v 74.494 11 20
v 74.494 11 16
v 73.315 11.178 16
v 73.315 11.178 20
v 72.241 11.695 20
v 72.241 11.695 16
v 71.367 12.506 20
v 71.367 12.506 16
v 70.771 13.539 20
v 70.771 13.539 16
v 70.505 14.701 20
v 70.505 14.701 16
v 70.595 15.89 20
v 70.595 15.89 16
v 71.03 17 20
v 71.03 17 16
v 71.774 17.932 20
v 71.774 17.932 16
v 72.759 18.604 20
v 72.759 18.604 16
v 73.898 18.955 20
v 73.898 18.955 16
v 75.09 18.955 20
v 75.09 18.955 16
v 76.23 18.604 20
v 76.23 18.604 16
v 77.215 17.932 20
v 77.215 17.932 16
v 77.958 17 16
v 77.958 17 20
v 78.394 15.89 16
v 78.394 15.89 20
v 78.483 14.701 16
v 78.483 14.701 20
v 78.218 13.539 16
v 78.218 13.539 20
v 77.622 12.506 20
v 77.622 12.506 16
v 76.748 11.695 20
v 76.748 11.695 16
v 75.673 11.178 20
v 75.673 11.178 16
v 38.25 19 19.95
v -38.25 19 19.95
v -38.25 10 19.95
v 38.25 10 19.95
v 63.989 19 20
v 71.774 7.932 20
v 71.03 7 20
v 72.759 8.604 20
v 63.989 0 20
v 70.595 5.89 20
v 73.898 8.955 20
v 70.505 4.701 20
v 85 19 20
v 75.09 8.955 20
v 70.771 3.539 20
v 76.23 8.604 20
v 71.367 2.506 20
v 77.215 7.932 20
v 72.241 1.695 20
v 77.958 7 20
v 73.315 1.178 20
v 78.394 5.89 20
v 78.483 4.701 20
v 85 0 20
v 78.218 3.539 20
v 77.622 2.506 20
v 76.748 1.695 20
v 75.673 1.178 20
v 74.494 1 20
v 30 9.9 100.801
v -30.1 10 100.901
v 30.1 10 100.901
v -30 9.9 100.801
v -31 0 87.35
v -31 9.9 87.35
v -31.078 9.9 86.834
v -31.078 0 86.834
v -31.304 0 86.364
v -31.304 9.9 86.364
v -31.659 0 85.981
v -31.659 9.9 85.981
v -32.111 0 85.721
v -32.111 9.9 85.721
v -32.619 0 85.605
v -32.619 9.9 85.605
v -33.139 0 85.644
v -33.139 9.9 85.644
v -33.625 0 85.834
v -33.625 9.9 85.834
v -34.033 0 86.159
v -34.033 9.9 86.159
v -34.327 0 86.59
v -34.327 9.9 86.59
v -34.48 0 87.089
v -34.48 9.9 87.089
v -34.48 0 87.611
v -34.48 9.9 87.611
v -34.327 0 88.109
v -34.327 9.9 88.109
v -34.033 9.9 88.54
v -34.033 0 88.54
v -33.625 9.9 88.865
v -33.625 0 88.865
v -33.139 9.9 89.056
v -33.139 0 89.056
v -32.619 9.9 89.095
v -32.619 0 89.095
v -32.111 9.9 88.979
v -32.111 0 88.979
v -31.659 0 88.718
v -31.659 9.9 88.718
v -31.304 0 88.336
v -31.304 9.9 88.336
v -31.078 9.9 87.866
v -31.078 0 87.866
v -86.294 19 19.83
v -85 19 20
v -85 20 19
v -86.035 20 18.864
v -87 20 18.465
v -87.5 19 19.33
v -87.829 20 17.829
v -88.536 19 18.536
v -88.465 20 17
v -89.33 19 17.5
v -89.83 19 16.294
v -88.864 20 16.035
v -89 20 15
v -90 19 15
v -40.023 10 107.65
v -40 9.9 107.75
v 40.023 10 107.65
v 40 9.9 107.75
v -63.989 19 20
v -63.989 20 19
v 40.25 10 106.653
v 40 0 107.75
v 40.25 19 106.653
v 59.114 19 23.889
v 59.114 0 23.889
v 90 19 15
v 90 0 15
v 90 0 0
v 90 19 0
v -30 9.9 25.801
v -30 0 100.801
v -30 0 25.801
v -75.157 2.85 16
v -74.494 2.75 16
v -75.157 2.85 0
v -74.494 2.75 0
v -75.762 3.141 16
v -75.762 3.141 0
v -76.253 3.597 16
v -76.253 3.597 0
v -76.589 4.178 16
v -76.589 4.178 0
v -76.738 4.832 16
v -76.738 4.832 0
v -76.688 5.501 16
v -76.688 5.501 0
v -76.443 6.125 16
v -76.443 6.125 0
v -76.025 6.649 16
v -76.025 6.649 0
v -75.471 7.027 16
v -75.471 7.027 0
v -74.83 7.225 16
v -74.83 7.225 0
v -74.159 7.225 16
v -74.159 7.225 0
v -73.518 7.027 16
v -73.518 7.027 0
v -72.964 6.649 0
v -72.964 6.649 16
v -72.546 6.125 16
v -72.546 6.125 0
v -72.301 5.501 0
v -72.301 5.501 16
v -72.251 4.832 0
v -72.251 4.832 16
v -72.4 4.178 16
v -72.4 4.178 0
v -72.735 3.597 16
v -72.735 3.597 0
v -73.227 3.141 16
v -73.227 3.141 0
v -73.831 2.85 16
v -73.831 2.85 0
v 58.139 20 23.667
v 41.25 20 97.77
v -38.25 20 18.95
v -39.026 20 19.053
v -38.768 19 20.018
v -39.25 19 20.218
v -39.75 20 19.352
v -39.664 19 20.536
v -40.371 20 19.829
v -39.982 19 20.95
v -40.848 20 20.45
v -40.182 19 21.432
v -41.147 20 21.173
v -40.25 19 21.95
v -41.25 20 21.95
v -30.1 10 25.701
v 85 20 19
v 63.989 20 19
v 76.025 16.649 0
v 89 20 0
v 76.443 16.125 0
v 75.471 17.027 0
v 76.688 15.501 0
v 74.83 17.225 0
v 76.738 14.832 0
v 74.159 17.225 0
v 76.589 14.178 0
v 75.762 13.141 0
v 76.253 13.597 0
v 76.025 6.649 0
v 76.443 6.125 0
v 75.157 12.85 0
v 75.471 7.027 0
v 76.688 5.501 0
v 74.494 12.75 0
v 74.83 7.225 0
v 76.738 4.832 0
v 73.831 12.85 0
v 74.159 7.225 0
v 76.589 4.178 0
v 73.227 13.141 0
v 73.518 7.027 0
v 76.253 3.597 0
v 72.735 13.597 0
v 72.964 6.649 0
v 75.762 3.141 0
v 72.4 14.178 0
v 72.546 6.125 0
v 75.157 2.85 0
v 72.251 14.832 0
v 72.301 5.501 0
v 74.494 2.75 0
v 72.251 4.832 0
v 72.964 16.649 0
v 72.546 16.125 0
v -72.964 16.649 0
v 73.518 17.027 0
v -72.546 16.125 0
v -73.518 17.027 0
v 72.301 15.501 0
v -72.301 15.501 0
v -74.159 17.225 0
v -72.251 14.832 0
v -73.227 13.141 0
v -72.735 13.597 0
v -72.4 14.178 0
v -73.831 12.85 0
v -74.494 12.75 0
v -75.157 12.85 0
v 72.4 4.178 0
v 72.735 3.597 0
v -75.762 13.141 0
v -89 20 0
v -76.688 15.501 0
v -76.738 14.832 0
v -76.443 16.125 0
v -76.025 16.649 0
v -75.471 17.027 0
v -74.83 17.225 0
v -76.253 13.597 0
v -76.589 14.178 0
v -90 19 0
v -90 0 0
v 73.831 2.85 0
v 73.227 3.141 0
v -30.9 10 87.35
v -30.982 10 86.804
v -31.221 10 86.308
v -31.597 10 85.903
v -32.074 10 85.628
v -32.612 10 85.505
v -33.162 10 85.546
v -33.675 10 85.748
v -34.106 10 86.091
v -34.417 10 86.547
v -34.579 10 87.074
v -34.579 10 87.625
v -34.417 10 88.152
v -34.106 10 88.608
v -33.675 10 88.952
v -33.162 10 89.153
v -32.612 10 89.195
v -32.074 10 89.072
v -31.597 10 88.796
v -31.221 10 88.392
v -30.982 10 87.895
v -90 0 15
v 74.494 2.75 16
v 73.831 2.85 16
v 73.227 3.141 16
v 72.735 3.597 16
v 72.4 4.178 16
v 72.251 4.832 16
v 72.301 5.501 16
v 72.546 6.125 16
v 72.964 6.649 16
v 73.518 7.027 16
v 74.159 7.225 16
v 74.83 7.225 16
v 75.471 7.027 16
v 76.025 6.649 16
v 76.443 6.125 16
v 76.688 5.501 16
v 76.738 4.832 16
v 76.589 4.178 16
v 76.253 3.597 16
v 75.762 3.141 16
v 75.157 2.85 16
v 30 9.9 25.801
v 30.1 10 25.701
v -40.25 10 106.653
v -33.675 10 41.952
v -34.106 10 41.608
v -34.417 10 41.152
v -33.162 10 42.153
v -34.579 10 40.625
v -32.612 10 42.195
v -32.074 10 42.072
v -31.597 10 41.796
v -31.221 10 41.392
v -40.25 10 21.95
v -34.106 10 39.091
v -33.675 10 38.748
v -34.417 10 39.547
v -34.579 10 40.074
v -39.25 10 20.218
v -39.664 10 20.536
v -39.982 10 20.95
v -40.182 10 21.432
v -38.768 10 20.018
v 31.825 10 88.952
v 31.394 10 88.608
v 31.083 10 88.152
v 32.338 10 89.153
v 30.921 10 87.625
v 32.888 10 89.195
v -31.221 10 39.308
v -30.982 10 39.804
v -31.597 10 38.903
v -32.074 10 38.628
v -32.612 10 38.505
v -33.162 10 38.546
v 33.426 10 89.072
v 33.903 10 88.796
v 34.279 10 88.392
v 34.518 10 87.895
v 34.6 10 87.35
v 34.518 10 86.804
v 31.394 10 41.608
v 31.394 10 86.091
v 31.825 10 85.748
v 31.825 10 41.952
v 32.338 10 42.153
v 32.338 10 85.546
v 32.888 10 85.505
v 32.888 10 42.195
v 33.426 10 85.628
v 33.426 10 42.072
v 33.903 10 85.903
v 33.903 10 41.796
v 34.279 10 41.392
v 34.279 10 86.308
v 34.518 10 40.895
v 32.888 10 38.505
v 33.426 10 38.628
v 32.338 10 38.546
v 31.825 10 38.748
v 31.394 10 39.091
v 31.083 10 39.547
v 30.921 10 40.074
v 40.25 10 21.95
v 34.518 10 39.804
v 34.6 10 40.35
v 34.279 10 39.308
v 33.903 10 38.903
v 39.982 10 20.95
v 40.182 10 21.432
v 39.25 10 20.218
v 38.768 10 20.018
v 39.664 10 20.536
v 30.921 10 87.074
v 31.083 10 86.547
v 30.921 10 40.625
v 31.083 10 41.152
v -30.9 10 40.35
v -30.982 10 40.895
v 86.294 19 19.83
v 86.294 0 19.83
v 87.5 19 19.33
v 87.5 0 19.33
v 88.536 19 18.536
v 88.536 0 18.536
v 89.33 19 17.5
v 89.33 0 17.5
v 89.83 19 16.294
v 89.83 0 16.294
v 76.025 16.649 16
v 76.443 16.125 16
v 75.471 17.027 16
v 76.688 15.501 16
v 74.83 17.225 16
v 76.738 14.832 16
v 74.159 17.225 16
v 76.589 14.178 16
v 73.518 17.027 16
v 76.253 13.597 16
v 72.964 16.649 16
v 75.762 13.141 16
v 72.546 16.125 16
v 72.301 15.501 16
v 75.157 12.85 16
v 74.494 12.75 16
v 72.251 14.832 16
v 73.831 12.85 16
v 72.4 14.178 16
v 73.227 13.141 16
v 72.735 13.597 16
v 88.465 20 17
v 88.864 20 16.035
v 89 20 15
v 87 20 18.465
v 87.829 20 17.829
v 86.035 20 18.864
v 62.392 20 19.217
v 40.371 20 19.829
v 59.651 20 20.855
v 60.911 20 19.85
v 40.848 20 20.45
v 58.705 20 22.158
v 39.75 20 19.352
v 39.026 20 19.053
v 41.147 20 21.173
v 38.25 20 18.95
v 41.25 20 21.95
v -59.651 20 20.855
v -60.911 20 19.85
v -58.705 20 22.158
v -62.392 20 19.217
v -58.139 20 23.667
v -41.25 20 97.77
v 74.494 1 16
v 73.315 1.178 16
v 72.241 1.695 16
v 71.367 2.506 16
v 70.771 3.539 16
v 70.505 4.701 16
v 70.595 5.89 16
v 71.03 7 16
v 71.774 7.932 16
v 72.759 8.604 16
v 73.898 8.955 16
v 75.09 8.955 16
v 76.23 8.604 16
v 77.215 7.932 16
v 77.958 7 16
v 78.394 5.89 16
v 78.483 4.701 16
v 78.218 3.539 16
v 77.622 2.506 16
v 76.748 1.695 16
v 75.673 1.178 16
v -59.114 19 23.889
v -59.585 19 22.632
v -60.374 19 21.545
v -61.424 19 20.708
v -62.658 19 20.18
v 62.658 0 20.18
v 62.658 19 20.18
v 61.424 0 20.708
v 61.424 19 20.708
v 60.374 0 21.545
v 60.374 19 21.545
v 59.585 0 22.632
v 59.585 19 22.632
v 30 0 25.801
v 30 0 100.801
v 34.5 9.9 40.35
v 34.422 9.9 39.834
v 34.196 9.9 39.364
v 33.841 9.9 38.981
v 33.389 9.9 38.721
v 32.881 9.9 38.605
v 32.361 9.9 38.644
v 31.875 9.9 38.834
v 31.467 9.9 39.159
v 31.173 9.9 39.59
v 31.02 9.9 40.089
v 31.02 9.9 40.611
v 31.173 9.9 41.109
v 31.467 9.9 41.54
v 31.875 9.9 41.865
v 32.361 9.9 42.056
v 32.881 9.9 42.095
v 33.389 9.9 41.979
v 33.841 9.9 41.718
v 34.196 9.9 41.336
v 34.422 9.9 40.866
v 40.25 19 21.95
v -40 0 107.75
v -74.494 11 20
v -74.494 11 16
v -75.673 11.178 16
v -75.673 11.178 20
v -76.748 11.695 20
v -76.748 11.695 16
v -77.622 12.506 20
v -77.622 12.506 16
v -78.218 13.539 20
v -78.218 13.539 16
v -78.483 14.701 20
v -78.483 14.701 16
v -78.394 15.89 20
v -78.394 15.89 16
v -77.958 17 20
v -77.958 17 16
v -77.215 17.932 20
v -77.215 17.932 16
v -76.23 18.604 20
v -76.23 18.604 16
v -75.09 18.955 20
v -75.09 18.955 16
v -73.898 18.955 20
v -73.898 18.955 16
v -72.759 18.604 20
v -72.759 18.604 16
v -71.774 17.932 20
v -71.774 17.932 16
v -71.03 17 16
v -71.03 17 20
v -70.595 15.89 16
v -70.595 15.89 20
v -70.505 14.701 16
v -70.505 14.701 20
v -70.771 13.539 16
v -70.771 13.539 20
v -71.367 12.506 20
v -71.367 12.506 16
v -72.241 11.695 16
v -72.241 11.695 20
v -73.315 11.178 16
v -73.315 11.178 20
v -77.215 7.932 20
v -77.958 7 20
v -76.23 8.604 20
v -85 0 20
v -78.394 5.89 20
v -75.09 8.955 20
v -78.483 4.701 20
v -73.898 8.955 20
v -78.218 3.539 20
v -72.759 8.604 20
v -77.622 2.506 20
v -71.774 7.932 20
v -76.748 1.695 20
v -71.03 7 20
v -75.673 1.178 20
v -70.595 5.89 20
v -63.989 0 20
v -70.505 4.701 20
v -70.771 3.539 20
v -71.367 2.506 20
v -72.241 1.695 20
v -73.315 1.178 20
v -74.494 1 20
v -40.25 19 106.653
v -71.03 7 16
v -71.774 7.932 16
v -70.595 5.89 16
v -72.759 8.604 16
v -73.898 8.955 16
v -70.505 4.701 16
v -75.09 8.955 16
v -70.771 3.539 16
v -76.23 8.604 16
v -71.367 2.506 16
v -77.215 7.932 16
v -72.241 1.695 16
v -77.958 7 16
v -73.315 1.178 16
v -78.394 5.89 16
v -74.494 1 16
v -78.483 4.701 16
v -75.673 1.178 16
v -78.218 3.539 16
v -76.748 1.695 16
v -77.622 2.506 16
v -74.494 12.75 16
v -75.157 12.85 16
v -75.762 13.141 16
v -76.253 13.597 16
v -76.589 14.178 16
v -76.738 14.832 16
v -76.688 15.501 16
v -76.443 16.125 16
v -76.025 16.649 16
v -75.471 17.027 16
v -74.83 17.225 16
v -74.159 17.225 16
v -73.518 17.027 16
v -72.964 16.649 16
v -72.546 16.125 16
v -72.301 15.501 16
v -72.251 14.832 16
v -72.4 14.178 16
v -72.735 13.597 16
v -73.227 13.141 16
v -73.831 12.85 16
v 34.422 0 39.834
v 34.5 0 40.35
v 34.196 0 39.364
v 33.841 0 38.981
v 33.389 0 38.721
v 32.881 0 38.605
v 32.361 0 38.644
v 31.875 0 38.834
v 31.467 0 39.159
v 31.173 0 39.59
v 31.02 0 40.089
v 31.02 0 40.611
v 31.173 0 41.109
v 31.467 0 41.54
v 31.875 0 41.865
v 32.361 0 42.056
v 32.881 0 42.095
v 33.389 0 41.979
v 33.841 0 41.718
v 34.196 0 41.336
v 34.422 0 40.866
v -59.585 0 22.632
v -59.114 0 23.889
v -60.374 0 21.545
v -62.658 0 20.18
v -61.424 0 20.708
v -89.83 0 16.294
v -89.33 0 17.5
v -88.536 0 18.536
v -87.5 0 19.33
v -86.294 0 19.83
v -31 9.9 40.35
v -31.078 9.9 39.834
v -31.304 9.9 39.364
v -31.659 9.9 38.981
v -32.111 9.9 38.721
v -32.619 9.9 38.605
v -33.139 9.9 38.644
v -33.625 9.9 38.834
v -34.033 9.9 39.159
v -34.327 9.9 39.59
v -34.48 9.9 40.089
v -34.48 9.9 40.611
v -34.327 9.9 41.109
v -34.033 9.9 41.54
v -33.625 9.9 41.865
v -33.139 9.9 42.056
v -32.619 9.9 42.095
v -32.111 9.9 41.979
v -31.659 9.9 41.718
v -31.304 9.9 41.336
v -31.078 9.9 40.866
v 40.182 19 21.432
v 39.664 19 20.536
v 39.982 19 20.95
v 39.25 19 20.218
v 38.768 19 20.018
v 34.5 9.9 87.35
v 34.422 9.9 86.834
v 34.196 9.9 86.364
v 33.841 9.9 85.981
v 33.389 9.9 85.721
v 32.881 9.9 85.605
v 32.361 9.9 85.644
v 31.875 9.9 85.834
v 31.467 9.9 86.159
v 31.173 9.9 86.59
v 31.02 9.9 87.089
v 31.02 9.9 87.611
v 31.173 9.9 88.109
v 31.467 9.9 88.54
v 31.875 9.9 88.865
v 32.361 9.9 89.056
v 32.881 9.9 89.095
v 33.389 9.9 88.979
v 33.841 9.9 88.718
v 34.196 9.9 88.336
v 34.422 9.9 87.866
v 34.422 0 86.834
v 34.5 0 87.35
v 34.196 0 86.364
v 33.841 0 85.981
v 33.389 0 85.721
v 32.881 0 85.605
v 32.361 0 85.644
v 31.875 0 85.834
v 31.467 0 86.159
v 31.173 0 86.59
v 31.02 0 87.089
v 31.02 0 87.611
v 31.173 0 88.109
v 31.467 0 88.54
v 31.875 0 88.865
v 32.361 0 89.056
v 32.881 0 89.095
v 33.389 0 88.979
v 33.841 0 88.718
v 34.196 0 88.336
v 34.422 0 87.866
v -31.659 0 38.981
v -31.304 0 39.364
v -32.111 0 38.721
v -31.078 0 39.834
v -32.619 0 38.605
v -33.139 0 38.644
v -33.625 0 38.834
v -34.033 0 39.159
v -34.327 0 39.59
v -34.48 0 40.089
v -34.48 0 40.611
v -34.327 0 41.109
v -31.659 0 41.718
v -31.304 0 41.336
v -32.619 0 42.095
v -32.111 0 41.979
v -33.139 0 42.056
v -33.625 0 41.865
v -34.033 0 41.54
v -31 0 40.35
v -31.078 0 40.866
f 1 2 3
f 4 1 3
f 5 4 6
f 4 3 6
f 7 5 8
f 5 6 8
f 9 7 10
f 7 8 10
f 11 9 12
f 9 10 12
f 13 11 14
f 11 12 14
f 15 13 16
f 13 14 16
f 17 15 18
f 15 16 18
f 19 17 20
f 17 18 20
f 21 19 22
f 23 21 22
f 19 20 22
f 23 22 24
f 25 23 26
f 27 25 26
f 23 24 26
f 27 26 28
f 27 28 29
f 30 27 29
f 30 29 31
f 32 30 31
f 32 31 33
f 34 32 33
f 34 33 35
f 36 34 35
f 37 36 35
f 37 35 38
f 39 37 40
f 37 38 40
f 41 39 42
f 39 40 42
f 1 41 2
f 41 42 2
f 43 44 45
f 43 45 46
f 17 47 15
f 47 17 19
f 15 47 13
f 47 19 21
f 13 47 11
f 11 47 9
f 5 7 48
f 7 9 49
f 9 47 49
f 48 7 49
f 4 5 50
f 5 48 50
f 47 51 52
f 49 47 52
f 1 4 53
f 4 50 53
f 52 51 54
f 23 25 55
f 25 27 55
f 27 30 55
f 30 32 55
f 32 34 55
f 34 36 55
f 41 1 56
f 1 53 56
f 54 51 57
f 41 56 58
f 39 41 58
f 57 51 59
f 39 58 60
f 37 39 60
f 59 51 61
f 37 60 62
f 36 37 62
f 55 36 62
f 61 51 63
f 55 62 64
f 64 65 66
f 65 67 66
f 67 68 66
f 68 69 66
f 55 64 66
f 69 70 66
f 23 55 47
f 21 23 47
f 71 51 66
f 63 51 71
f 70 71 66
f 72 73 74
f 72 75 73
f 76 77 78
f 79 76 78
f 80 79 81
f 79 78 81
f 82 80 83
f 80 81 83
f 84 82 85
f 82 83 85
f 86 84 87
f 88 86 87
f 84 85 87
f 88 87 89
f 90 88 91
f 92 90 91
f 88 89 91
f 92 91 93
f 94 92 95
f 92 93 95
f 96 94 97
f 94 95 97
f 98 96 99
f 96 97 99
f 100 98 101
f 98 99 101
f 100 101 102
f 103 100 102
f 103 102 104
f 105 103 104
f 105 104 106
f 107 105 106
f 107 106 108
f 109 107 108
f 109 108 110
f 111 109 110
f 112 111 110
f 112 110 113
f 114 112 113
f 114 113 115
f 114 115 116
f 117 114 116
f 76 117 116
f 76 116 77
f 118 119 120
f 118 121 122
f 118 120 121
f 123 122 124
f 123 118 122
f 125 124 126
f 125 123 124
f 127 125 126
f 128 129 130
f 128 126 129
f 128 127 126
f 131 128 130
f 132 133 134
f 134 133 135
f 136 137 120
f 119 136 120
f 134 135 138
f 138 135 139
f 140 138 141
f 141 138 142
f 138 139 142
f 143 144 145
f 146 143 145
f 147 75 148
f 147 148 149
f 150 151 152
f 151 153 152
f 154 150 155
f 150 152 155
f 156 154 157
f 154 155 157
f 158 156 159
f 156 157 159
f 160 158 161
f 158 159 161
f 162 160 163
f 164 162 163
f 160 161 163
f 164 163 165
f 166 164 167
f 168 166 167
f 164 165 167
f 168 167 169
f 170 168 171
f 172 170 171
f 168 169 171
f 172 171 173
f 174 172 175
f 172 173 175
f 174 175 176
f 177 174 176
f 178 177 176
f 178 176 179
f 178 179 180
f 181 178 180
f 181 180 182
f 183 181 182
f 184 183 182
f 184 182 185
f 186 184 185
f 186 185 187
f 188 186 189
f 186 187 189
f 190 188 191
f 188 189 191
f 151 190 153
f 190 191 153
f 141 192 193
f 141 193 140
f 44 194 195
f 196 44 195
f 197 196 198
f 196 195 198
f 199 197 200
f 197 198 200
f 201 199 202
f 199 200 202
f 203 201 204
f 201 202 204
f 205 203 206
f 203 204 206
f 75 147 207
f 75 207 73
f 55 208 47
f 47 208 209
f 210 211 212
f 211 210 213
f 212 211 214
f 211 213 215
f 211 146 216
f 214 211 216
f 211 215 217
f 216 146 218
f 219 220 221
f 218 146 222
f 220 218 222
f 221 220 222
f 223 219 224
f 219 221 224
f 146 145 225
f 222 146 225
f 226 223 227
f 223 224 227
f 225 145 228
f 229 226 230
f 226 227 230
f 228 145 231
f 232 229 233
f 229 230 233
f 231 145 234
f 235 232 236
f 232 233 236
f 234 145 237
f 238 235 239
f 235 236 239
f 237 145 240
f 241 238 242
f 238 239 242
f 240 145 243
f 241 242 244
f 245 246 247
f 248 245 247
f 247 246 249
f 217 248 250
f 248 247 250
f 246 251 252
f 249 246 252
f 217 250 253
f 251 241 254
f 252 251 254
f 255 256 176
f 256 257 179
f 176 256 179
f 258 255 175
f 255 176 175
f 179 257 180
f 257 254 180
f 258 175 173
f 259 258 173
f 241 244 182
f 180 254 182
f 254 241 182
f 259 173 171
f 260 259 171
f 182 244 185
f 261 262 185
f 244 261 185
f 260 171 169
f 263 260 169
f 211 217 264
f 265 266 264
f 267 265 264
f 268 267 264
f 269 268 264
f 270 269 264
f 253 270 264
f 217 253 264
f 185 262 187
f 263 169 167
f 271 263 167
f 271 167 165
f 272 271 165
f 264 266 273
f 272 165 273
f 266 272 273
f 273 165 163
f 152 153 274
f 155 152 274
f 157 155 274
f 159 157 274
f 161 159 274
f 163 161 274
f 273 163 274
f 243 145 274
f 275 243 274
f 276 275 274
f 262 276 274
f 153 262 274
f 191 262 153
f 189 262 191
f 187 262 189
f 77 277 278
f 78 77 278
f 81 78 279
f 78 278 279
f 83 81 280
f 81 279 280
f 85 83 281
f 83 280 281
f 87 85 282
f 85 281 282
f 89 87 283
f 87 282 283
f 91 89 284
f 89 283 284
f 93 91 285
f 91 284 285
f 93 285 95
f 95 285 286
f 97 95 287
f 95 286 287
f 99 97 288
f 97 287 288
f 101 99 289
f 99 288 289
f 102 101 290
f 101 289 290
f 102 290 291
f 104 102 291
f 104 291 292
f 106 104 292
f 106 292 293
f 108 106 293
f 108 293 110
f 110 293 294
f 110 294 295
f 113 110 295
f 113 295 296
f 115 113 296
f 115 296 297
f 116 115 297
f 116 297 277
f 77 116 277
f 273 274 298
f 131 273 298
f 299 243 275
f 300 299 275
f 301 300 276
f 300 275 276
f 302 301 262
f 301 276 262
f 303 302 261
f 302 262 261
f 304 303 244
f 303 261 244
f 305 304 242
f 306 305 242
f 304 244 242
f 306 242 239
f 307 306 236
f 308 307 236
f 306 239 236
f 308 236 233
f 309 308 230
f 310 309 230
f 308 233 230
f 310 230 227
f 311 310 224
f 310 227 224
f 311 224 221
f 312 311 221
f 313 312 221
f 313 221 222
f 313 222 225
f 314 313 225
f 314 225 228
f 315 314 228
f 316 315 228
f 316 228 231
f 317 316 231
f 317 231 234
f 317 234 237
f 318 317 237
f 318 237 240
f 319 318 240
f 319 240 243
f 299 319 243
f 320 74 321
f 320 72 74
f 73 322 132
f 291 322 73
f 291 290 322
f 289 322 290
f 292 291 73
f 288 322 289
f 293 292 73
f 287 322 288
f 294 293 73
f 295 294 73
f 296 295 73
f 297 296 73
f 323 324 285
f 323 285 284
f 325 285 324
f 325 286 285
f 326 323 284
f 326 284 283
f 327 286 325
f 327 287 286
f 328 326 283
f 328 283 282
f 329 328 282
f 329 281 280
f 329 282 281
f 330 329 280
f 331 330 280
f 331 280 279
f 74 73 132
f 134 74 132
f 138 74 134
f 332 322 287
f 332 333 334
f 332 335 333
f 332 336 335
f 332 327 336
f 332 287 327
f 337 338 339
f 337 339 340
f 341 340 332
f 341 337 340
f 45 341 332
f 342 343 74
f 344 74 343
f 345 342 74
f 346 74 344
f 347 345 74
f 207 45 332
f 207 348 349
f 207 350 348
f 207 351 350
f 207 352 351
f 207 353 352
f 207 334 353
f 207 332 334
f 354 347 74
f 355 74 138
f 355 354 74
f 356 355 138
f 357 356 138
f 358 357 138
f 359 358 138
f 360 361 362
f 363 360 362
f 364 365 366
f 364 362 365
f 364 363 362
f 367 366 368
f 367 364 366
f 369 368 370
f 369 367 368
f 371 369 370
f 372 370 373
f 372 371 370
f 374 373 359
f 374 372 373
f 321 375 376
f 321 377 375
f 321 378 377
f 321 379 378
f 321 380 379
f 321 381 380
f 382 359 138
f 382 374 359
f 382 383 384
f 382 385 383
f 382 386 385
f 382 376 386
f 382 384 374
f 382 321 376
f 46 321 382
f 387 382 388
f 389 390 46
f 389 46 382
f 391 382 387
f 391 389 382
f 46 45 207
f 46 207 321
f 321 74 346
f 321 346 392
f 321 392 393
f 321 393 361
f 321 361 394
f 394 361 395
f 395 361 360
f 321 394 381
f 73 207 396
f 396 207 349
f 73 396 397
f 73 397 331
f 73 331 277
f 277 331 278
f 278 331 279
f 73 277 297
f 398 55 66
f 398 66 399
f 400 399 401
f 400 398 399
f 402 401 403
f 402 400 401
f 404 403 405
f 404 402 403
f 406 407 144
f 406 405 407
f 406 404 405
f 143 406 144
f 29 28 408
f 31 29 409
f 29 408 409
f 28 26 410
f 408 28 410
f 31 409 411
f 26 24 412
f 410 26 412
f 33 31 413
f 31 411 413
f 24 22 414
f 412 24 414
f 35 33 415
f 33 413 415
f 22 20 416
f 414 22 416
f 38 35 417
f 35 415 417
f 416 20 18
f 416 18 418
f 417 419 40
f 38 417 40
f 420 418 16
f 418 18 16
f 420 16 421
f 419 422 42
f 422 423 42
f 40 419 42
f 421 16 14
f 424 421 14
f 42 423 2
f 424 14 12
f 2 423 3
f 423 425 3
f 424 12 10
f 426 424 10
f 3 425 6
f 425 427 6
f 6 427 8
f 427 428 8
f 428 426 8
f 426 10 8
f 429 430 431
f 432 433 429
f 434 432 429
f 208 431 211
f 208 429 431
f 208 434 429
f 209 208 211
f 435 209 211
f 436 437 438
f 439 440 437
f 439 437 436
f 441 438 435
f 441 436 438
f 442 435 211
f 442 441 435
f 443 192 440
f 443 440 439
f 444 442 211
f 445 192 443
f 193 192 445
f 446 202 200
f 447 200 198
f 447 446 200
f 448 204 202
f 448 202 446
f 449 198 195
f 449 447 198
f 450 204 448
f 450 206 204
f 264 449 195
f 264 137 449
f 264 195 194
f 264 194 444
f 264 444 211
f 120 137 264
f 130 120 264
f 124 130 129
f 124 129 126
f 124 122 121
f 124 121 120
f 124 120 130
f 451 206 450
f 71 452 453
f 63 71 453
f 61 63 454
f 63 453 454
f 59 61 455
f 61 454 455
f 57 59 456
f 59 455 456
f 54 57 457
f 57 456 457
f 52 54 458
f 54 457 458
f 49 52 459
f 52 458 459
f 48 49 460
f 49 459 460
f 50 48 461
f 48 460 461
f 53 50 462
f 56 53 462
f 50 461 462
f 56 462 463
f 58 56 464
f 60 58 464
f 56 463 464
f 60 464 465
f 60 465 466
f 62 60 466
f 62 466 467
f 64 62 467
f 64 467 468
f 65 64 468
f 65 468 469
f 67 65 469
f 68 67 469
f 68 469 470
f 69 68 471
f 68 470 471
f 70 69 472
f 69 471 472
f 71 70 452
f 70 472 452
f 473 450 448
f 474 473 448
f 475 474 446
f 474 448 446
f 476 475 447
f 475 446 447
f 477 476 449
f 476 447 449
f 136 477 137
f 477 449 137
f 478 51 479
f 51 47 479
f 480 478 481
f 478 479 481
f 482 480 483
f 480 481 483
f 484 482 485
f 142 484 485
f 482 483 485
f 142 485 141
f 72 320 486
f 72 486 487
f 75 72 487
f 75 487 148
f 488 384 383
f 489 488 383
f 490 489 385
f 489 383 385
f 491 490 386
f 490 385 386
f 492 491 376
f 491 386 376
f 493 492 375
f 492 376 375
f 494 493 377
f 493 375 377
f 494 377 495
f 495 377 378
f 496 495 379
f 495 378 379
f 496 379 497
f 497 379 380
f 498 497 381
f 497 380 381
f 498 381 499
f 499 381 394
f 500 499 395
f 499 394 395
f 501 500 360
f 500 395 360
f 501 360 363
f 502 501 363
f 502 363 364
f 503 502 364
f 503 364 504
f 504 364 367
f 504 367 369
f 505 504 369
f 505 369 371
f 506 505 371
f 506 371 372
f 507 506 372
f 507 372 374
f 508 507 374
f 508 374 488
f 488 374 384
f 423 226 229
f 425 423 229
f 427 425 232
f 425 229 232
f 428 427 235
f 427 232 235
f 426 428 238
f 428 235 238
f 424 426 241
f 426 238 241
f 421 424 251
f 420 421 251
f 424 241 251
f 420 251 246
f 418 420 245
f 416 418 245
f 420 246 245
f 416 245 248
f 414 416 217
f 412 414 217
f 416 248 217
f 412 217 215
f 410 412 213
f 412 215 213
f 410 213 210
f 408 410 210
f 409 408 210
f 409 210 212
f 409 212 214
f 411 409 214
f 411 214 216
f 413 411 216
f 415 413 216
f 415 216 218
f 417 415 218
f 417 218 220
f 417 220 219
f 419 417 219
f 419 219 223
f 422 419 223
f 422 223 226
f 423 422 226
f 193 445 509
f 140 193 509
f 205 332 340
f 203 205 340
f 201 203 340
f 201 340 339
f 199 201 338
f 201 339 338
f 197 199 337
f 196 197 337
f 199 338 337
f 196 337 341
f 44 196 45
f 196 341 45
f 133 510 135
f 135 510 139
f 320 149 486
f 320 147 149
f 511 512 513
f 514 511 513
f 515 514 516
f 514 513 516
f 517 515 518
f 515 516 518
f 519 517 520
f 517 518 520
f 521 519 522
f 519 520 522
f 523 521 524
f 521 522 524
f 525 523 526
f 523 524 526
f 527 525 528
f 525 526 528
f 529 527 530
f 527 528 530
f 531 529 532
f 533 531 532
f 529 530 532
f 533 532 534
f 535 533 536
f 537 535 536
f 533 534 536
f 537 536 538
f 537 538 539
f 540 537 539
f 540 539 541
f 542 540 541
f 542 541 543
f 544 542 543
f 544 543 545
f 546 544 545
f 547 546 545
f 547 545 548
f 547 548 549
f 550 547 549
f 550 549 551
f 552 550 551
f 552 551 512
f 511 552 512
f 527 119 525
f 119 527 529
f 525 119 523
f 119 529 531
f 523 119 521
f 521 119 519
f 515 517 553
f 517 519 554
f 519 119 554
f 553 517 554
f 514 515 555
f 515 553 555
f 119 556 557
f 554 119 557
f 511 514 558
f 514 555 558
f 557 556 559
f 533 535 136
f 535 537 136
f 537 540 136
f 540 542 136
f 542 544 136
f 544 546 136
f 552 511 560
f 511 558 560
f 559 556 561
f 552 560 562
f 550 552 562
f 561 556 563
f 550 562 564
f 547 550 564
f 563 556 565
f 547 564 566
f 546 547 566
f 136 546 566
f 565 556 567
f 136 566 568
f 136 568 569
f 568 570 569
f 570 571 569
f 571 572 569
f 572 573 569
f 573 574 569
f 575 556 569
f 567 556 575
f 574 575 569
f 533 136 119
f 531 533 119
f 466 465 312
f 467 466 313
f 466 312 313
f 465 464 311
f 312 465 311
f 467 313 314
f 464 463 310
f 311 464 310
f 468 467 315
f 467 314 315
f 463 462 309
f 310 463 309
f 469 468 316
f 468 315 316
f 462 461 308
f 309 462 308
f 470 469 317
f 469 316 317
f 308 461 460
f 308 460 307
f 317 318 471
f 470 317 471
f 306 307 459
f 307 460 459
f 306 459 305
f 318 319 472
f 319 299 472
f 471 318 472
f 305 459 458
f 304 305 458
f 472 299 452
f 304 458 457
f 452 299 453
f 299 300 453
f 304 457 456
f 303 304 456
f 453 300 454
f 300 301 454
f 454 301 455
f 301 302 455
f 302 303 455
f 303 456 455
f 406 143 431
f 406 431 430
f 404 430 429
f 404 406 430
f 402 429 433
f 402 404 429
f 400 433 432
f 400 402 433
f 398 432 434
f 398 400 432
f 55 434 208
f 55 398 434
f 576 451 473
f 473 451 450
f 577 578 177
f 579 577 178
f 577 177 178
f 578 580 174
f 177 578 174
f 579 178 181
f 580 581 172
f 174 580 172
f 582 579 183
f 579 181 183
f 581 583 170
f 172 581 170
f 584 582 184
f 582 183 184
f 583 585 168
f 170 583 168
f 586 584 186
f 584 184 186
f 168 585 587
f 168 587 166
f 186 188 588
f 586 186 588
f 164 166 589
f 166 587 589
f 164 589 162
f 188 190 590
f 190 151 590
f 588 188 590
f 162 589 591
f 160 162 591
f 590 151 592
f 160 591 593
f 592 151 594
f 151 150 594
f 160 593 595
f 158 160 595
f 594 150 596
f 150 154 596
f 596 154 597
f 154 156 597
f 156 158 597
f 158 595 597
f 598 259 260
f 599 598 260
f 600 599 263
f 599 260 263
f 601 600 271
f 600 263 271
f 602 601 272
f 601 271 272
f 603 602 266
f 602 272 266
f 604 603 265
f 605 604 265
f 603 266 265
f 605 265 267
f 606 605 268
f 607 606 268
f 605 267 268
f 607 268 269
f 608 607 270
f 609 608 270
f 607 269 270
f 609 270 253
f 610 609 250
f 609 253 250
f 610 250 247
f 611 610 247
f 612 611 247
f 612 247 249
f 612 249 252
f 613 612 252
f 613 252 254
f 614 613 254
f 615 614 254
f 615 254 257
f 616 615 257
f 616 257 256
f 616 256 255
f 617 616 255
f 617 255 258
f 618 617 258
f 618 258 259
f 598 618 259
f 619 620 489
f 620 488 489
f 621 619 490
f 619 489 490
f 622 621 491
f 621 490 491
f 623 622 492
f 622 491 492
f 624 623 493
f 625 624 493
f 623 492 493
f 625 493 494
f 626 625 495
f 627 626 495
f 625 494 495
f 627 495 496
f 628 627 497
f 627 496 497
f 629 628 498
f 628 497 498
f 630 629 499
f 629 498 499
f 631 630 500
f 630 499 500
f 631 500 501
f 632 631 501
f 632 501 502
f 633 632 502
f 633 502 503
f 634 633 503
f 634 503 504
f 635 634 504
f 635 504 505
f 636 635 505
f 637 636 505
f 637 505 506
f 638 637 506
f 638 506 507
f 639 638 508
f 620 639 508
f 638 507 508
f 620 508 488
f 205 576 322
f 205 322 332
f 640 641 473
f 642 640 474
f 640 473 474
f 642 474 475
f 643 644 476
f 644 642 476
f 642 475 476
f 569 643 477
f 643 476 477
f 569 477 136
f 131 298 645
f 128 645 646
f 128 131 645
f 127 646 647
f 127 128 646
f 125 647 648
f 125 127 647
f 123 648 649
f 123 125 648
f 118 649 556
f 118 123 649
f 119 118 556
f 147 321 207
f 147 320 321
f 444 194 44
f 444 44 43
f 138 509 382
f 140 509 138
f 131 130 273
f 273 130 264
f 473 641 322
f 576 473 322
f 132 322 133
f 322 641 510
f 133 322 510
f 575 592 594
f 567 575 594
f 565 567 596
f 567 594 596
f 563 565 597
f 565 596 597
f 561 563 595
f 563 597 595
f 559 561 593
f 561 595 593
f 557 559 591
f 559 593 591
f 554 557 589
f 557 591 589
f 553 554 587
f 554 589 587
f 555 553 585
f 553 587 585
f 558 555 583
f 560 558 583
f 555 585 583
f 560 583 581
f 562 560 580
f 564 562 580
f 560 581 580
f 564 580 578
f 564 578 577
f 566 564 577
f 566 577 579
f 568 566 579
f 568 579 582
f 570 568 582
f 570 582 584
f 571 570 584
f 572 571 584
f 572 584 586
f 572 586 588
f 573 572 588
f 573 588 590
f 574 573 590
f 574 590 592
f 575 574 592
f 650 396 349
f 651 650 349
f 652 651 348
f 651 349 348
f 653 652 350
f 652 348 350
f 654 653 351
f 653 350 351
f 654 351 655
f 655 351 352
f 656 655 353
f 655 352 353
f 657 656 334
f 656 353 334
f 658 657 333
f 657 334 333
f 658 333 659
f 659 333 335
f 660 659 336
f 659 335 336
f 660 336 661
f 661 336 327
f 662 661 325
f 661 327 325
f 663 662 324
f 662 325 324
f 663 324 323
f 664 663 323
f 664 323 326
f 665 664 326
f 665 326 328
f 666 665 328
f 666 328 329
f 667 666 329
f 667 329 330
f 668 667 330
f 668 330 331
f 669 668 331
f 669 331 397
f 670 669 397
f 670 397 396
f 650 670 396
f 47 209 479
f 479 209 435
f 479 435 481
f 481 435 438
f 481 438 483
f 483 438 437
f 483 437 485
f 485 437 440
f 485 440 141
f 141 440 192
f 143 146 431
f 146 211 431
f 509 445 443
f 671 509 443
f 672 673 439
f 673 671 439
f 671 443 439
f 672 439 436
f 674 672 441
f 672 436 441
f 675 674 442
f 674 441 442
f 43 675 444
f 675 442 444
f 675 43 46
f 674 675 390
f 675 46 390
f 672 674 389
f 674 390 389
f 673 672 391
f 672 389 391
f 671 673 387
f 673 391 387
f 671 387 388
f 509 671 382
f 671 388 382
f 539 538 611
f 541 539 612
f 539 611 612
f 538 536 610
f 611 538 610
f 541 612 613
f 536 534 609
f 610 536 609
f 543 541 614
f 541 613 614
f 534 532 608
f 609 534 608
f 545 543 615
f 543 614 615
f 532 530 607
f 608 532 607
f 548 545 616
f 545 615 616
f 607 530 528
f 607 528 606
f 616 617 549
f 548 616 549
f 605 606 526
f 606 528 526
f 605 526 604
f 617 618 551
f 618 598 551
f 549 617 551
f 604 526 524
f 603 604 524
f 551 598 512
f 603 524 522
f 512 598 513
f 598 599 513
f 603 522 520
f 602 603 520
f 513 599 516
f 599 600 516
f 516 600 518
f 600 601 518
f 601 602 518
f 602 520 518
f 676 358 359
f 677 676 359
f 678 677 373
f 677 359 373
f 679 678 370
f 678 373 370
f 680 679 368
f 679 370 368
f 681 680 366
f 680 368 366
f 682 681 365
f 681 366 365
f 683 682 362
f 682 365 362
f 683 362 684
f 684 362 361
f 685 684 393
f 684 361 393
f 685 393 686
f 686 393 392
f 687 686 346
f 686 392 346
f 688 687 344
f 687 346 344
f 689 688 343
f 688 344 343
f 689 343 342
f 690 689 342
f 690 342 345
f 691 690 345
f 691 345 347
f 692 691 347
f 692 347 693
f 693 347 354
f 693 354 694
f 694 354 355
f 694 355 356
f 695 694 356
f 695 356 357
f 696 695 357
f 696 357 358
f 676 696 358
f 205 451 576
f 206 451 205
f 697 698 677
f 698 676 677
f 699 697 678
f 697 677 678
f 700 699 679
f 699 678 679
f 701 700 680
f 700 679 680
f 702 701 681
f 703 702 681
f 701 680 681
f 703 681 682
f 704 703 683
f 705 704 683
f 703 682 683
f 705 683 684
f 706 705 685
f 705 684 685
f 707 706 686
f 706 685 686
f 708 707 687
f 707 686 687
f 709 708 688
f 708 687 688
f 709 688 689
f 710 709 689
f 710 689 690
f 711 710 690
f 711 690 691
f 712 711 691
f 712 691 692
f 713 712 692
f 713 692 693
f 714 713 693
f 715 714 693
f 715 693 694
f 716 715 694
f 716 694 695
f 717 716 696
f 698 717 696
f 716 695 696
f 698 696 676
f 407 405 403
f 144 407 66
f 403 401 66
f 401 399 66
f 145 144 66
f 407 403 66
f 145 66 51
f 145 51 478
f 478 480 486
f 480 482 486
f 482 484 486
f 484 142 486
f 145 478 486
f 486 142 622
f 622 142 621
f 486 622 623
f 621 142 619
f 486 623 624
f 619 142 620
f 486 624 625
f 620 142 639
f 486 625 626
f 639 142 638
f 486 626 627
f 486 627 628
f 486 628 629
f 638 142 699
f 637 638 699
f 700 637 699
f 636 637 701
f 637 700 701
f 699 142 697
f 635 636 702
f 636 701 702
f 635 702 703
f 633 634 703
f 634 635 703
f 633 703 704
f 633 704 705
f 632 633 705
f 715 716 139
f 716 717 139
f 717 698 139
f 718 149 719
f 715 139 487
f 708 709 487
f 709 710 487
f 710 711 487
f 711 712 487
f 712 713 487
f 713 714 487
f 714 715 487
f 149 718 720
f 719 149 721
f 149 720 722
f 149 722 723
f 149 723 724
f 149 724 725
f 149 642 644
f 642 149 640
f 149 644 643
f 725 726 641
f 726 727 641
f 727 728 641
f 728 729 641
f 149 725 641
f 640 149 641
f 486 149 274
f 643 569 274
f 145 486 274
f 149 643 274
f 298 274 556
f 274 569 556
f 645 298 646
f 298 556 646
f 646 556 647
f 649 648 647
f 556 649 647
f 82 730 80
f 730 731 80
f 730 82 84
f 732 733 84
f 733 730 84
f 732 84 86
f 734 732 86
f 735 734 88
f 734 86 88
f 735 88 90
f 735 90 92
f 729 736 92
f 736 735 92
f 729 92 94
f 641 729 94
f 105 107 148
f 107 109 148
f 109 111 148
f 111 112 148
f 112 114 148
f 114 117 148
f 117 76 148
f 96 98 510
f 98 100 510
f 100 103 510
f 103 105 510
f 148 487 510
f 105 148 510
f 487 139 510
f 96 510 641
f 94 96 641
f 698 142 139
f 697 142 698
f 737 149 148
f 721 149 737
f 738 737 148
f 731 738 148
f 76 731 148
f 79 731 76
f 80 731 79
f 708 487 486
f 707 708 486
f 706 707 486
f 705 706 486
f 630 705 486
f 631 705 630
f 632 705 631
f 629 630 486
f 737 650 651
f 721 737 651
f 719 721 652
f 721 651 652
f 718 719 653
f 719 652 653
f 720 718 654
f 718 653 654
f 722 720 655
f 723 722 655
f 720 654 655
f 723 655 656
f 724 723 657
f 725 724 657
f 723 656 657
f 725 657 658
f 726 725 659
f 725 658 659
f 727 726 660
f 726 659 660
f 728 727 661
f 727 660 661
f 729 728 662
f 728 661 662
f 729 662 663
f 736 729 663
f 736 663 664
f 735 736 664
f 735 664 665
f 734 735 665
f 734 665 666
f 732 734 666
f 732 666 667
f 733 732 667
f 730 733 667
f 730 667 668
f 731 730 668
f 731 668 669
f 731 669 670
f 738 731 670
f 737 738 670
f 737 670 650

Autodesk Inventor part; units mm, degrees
ref_plane "YZ Plane" through (0, 0, 0) normal (1, 0, 0) x (0, 1, 0)
ref_plane "XZ Plane" through (0, 0, 0) normal (0, 1, 0) x (-1, 0, 0)
ref_plane "XY Plane" through (0, 0, 0) normal (0, 0, 1) x (1, 0, 0)
sketch "Skizze1" plane through (0, 0, 0) normal (0, 1, 0) x (-1, 0, 0)
  line L0 (0, 0) -> (90, 0)
  line L1 (90, 0) -> (90, 20)
  line L2 (90, 20) -> (60, 20)
  line L3 (60, 20) -> (40, 107.7496)
  line L4 (40, 107.7496) -> (-40, 107.7496)
  line L5 (-40, 107.7496) -> (-60, 20)
  line L6 (-60, 20) -> (-90, 20)
  line L7 (-90, 20) -> (-90, 0)
  line L8 (-90, 0) -> (0, 0)
  dimension "d0" = 90
  dimension "d1" = 20
  dimension "d2" = 30
  dimension "d3" = 90
  dimension "d4" = 80
  dimension "d5" = 90
  dimension "d6" = 30
  dimension "d7" = 20
  dimension "d9" = 90
extrude "Extrusion1" add sketch "Skizze1" along normal blind 20
sketch "Skizze2" plane through (0, 20, 0) normal (0, 1, 0) x (1, 0, 0)
  line L0 (-60, -20) -> (-40, -107.7496) construction
  line L1 (-60, -20) -> (60, -20) construction
  line L2 (40.25, -107.7998) -> (-40.25, -107.7998)
  line L3 (-40.25, -107.7998) -> (-40.25, -19.9498)
  line L4 (-40.25, -19.9498) -> (40.25, -19.9498)
  line L5 (40.25, -19.9498) -> (40.25, -107.7998)
  line L6 (40.25, -107.7998) -> (-40.25, -19.9498) construction
  line L7 (-40.25, -107.7998) -> (40.25, -19.9498) construction
  point P0 (0, 0)
  point P1 (0, -63.8748)
  point P2 (0, -63.8748)
  dimension "d12" = 80.5
  dimension "d13" = 87.85
extrude "Extrusion2" cut sketch "Skizze2" against normal blind 10
sketch "Skizze3" plane through (0, 10, 0) normal (0, 1, 0) x (1, 0, 0)
  line L0 (40.25, -106.6528) -> (40, -107.7496) projected
  line L1 (40.25, -19.9498) -> (40.25, -106.6528) projected
  line L2 (-40.25, -19.9498) -> (40.25, -19.9498) projected
  line L3 (-40.25, -106.6528) -> (-40.25, -19.9498) projected
  line L4 (-40, -107.7496) -> (-40.25, -106.6528) projected
  line L5 (40, -107.7496) -> (-40, -107.7496) projected
  line L6 (30, -25.8013) -> (30, -100.8013)
  line L7 (30, -100.8013) -> (-30, -100.8013)
  line L8 (-30, -100.8013) -> (-30, -25.8013)
  line L9 (-30, -25.8013) -> (30, -25.8013)
  line L10 (30, -25.8013) -> (-30, -100.8013) construction
  line L11 (30, -100.8013) -> (-30, -25.8013) construction
  line L12 (-32.75, -100.2496) -> (-32.75, -27.4498) construction
  line L13 (-32.75, -27.4498) -> (32.75, -27.4498) construction
  line L14 (32.75, -27.4498) -> (32.75, -100.2496) construction
  line L15 (32.75, -100.2496) -> (-32.75, -100.2496) construction
  line L16 (-32.75, -63.8497) -> (-32.75, -40.3497) construction
  line L17 (-32.75, -63.8497) -> (-32.75, -87.3497) construction
  line L18 (-32.75, -87.3497) -> (32.75, -87.3497) construction
  line L19 (-32.75, -40.3497) -> (32.75, -40.3497) construction
  circle A0 centre (-32.75, -87.3497) radius 1.75
  circle A1 centre (-32.75, -40.3497) radius 1.75
  circle A2 centre (32.75, -40.3497) radius 1.75
  circle A3 centre (32.75, -87.3497) radius 1.75
  point P0 (0, 0)
  point P1 (0, -63.3013)
  point P2 (0, -63.3013)
  dimension "d16" = 75
  dimension "d17" = 60
  dimension "d18" = 7.5
  dimension "d19" = 23.5
  dimension "d20" = 23.5
  dimension "d21" = 3.5
  dimension "d22" = 3.5
  dimension "d23" = 3.5
  dimension "d24" = 3.5
extrude "Extrusion3" cut sketch "Skizze3" against normal blind 10 contours L6 L7 L8 L9 | A0 | A1 | A2 | A3
fillet "Rundung1" radius 5 4 edges at (-90, 10, 20) (90, 10, 20) (60, 10, 20) (-60, 10, 20)
fillet "Rundung2" radius 2 2 edges at (-40.25, 15, 19.9498) (40.25, 15, 19.9498)
sketch "Skizze4" plane through (-85, 0, 20) normal (0, 0, 1) x (1, 0, 0)
  line L0 (21.0114, 20) -> (21.0114, 0) construction
  line L1 (0, 20) -> (21.0114, 20) construction
  line L2 (0, 0) -> (0, 20) construction
  line L3 (0, 0) -> (21.0114, 0) construction
  line L4 (0, 0) -> (0, 20) construction
  line L5 (148.9886, 0) -> (148.9886, 20) construction
  line L6 (148.9886, 0) -> (170, 0) construction
  line L7 (170, 20) -> (170, 0) construction
  line L8 (148.9886, 20) -> (170, 20) construction
  line L9 (175, 20) -> (-5, 20) construction
  line L10 (159.4943, 20) -> (159.4943, 0) construction
  line L11 (148.9886, 10) -> (170, 10) construction
  line L12 (170, 20) -> (170, 0) construction
  line L13 (148.9886, 10) -> (159.4943, 20) construction
  line L14 (148.9886, 0) -> (148.9886, 20) construction
  line L15 (148.9886, 20) -> (159.4943, 10) construction
  line L16 (154.2415, 15) -> (159.4943, 15) construction
  line L17 (148.9886, 10) -> (159.4943, 0) construction
  line L18 (159.4943, 10) -> (148.9886, 0) construction
  line L19 (154.2415, 5) -> (159.4943, 5) construction
  line L20 (10.5057, 20) -> (10.5057, 0) construction
  line L21 (0, 20) -> (10.5057, 10) construction
  line L22 (10.5057, 20) -> (0, 10) construction
  line L23 (0, 10) -> (10.5057, 0) construction
  line L24 (10.5057, 10) -> (0, 0) construction
  line L25 (5.2528, 5) -> (10.5057, 5) construction
  line L26 (5.2528, 15) -> (10.5057, 15) construction
  point P0 (85, 0)
hole "Bohrung1" at (74.4943, 15, 20) at (74.4943, 5, 20) at (-74.4943, 15, 20) at (-74.4943, 5, 20) direction (0, 0, -1) diameter 4.5 end through all counterbore diameter 8 counterbore depth 4 clearance for "Innensechskantkopfschraube" size "M4" standard "ANSI Metrisches M Profil"
chamfer "Fase1" distance 0.1 angle 45 8 edges at (-30, 10, 63.3013) (0, 10, 25.8013) (0, 10, 100.8013) (30, 10, 63.3013) (31, 10, 40.3497) (31, 10, 87.3497) (-34.5, 10, 40.3497) (-34.5, 10, 87.3497)
chamfer "Fase2" distance 1 angle 45 13 edges at (-40.25, 20, 64.3013) (-39.6642, 20, 20.5356) (0, 20, 19.9498) (39.6642, 20, 20.5356) (40.25, 20, 64.3013) (-49.6818, 20, 65.2708) (-74.4943, 20, 20) (-88.5355, 20, 18.5355) (-90, 20, 7.5) (49.6818, 20, 65.2708) (74.4943, 20, 20) (88.5355, 20, 18.5355) (90, 20, 7.5)
chamfer "Fase3" distance 0.1 angle 45 1 edges at (0, 10, 107.7496)
thread "Gewinde1" size "M4x0.7" class "6H" standard "ISO Metric profile" full length
thread "Gewinde2" size "M4x0.7" class "6H" standard "ISO Metric profile" full length
thread "Gewinde3" size "M4x0.7" class "6H" standard "ISO Metric profile" full length
thread "Gewinde4" size "M4x0.7" class "6H" standard "ISO Metric profile" full length
properties part number "Z-Motorhalter" material "Aluminium 6061"
